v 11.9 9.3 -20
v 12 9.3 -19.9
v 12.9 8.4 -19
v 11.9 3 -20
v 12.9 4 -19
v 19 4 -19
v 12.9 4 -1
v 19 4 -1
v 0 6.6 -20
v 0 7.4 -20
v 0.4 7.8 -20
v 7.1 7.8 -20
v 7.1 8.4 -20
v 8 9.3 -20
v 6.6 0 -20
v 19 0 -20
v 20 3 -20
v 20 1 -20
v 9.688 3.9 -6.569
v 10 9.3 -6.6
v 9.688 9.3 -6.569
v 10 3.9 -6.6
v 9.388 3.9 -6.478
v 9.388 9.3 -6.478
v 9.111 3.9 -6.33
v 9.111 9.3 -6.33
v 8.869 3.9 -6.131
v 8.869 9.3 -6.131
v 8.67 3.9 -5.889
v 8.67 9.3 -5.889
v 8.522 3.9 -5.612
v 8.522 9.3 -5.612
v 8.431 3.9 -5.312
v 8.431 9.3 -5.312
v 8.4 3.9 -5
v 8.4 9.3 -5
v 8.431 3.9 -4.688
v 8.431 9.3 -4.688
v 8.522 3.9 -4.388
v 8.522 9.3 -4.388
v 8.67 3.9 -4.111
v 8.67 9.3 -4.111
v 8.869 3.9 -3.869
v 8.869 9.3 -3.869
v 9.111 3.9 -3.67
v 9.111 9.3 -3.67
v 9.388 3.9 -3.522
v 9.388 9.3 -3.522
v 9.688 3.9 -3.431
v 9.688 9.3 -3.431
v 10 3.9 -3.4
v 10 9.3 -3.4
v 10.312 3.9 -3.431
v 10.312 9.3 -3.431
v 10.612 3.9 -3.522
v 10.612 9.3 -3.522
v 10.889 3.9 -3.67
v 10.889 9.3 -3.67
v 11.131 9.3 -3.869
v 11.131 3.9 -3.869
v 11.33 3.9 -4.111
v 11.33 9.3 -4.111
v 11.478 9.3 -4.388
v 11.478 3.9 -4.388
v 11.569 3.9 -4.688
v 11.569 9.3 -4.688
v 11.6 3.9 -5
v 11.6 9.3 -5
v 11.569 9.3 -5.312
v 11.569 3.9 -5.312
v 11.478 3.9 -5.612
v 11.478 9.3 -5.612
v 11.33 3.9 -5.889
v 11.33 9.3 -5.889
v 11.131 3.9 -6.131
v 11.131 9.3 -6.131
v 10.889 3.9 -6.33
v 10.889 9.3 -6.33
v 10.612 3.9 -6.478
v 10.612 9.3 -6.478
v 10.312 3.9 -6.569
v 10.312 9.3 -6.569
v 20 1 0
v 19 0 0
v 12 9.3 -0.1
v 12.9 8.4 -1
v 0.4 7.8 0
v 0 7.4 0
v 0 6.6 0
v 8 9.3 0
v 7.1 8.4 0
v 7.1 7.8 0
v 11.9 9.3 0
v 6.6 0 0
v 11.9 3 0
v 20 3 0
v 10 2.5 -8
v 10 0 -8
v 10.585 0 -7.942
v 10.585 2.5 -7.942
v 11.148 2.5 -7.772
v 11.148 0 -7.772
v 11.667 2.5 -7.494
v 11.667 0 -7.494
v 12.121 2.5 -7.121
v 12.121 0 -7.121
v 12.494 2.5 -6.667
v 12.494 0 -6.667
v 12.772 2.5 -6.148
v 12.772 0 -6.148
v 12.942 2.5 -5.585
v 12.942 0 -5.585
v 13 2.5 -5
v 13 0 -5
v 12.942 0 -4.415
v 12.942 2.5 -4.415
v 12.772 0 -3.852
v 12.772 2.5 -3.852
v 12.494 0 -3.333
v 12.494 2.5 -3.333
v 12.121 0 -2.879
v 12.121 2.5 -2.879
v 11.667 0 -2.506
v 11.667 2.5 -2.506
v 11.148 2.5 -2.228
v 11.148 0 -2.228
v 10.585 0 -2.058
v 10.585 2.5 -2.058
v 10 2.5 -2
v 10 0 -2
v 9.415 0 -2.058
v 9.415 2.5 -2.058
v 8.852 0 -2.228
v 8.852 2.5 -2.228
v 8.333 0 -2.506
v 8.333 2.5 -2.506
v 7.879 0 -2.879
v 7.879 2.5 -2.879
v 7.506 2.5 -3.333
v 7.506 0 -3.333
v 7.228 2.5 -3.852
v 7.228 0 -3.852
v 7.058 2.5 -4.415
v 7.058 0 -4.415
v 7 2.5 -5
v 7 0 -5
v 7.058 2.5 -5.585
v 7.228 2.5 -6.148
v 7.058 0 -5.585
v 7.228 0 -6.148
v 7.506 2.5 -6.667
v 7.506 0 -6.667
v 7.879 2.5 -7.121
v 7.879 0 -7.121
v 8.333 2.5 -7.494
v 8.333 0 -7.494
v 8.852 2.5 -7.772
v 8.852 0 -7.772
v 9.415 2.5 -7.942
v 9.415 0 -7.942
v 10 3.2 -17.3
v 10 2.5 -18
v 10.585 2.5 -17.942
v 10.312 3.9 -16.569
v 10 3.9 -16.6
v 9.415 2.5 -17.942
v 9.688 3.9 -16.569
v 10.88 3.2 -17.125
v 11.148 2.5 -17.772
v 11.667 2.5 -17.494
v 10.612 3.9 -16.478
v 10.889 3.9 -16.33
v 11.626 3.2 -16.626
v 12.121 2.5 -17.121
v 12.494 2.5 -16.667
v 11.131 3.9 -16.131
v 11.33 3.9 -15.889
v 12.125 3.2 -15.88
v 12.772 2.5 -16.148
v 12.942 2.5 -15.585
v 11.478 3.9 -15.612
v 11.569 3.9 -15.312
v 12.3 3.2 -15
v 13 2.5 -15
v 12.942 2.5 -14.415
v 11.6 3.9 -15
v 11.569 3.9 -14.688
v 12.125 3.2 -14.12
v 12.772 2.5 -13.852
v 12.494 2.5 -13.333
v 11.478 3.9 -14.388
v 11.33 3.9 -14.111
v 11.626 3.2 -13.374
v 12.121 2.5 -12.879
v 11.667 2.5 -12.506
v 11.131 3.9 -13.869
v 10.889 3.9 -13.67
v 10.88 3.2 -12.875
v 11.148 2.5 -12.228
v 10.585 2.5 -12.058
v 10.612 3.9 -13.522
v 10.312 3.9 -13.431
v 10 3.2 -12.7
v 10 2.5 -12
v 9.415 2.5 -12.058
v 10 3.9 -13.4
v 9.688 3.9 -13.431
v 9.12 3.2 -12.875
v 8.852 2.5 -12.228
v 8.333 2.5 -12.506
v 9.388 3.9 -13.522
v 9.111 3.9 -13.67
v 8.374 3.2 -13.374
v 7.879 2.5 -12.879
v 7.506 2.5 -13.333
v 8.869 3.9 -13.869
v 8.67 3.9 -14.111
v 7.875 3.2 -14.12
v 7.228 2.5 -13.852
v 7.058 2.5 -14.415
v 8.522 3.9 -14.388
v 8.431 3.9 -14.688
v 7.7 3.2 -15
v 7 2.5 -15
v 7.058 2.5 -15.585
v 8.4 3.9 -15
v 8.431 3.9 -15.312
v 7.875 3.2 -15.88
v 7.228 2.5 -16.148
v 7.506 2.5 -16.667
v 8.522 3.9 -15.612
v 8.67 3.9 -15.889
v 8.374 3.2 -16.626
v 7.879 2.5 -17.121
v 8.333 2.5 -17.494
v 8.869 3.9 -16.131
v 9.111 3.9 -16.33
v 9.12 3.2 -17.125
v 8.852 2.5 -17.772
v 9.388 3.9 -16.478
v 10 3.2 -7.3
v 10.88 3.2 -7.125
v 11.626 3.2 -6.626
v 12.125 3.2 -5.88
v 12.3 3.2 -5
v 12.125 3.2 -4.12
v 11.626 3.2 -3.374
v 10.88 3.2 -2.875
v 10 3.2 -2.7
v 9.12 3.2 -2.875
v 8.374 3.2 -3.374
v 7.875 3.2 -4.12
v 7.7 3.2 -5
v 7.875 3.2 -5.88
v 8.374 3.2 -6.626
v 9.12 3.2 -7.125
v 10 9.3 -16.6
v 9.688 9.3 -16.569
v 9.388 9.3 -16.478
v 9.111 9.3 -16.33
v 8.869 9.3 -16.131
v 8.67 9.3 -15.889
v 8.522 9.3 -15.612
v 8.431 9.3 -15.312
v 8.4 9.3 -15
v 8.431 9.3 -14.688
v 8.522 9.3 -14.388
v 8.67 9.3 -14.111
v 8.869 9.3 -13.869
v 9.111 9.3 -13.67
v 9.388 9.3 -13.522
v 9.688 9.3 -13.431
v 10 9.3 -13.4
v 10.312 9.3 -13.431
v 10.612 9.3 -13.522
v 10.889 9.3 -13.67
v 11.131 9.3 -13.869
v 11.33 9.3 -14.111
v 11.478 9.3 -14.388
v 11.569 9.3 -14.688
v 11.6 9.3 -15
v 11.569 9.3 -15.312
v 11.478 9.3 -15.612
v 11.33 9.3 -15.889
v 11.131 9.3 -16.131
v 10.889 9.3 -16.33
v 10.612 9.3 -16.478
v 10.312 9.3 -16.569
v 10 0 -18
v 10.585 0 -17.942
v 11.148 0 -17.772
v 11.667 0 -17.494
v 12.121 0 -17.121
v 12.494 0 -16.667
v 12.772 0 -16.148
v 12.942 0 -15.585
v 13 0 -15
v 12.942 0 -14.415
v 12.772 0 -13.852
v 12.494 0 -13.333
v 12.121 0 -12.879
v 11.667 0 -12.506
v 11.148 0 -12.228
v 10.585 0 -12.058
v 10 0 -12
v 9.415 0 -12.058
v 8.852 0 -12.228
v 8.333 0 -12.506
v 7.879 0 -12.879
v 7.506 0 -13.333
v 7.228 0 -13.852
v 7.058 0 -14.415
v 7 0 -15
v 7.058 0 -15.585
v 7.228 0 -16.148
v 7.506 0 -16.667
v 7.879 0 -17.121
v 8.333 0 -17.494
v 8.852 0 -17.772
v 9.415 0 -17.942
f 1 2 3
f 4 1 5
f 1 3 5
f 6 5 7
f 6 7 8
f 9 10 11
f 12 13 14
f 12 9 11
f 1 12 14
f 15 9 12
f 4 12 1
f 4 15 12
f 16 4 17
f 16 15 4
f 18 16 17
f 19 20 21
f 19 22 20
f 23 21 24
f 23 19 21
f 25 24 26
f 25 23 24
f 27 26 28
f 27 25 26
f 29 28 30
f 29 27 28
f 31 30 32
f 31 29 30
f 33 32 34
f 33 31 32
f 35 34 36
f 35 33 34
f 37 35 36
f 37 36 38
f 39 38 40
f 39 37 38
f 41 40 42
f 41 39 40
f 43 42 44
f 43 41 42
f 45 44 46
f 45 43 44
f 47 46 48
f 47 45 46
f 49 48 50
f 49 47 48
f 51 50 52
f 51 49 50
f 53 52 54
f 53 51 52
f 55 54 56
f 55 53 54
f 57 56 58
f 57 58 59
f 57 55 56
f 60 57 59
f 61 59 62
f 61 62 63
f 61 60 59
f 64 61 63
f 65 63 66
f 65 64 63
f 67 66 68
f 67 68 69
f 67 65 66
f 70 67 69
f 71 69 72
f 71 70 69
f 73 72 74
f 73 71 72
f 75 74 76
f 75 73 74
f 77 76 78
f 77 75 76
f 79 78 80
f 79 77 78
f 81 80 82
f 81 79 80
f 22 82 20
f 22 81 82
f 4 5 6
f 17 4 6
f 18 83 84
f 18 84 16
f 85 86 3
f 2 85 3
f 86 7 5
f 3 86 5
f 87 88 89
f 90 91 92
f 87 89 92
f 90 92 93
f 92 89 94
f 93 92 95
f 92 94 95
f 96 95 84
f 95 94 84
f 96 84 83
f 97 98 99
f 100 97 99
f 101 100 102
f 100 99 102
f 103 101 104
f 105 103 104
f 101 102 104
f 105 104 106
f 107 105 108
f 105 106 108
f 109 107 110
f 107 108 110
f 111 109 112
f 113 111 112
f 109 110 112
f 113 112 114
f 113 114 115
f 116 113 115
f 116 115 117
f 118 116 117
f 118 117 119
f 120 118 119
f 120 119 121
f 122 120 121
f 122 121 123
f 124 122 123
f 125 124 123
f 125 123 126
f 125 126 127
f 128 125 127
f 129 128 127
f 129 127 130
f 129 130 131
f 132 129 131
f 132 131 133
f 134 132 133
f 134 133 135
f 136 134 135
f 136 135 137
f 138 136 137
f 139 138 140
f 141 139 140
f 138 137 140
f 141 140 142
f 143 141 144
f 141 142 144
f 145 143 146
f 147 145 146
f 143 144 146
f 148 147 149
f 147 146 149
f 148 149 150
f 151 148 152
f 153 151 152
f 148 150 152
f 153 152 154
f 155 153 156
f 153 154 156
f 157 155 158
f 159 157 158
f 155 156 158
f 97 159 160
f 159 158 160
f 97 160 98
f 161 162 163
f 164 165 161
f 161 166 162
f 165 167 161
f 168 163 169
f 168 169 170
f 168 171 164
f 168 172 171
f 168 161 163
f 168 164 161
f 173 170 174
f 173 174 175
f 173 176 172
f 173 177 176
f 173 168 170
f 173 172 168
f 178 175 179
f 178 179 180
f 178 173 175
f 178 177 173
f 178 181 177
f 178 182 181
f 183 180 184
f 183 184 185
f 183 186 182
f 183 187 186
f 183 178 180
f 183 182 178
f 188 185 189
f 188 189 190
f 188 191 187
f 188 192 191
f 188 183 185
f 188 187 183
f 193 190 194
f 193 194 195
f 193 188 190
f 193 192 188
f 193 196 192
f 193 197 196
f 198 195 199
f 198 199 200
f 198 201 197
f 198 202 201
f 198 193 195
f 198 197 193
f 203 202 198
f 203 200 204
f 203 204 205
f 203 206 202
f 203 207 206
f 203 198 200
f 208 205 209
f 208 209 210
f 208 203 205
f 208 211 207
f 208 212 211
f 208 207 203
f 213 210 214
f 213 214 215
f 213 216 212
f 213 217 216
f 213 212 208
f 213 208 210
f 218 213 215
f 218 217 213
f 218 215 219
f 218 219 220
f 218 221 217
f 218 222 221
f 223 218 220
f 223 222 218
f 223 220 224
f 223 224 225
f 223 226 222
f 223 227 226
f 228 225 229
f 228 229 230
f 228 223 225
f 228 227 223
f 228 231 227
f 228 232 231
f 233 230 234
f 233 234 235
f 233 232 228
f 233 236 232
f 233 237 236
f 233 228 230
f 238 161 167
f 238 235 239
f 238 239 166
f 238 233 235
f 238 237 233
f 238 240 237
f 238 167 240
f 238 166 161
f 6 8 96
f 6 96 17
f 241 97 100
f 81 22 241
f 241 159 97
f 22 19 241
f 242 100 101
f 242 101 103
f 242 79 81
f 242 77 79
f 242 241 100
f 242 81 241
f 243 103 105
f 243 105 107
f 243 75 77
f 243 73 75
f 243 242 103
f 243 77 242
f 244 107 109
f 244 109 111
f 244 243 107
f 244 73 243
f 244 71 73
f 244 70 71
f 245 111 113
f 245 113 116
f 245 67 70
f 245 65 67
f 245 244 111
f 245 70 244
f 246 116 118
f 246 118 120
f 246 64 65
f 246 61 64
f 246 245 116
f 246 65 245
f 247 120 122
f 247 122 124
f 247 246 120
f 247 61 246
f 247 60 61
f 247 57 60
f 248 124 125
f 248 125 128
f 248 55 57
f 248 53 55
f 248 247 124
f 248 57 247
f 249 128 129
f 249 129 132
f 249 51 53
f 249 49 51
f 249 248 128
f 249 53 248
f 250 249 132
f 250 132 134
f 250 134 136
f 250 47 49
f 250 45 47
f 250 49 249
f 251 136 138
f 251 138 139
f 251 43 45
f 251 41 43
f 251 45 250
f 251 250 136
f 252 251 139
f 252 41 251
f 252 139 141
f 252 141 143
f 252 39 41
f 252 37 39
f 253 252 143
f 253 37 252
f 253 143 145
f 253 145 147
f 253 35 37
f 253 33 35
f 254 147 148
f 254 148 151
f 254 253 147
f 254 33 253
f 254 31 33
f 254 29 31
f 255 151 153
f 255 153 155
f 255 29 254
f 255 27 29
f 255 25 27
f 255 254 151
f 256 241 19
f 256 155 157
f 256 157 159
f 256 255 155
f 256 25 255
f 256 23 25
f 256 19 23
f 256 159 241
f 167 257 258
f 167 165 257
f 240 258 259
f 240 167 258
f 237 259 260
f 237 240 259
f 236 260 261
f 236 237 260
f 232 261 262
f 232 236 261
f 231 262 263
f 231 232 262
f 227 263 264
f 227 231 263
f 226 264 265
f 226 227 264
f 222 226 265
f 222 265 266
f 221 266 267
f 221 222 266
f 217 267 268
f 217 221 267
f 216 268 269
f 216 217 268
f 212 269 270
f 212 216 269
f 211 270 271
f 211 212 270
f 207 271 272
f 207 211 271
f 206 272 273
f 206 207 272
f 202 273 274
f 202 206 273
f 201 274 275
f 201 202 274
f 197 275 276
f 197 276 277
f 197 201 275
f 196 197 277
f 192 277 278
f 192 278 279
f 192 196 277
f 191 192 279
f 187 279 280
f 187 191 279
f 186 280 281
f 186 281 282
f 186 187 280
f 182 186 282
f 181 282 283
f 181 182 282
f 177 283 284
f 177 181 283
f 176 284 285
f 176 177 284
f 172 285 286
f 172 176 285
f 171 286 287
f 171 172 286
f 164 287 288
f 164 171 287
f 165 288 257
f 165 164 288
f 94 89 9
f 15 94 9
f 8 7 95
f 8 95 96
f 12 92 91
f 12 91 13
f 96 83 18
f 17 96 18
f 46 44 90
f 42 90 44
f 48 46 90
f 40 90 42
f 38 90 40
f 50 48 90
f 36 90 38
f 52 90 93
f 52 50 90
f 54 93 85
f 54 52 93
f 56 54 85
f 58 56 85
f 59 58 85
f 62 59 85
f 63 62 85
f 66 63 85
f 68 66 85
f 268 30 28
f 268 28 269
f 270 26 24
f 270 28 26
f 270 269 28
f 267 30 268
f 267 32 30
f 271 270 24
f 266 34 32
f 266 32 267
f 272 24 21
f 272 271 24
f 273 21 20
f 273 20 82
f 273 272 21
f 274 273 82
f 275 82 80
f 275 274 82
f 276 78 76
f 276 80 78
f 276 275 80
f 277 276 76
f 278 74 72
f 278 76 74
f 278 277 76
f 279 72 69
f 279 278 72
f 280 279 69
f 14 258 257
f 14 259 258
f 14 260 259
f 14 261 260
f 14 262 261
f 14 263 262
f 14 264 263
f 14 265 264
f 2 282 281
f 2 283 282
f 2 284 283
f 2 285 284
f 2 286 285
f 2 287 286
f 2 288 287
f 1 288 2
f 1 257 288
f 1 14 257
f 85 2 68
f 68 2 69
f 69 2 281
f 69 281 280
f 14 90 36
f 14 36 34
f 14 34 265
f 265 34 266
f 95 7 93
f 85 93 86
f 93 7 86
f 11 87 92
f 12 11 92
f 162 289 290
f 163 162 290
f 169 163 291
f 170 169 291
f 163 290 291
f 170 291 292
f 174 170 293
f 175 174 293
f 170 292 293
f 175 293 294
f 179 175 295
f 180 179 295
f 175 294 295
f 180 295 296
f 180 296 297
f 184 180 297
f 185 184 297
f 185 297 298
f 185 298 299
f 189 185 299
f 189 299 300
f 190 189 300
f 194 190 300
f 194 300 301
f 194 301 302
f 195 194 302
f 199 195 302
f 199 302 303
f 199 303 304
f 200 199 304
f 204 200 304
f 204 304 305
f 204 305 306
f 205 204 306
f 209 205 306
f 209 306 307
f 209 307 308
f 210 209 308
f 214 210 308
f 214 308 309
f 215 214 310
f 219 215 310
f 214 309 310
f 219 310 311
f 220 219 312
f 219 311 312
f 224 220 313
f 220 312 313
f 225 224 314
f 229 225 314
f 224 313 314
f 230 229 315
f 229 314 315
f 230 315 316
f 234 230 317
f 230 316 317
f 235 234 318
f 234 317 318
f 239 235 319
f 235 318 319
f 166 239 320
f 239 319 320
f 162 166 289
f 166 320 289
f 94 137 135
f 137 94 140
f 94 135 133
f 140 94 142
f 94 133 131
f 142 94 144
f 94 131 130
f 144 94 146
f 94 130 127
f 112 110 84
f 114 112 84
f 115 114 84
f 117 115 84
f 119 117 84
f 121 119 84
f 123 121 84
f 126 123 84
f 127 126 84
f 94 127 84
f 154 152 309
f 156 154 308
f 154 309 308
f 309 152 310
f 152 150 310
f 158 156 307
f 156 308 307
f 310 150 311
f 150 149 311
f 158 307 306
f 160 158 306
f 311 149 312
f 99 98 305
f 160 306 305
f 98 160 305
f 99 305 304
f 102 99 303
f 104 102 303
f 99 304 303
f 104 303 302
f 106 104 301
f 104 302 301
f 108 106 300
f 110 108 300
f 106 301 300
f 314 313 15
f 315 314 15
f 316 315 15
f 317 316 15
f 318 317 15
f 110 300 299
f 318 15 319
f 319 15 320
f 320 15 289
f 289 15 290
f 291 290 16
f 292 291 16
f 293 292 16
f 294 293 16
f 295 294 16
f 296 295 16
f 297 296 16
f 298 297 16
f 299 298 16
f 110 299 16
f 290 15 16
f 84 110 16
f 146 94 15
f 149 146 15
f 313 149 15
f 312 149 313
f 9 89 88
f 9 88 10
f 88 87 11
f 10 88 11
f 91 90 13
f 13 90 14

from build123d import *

# Parameters (mm, degrees)
SKETCH_1_W          = 20
SKETCH_1_H          = 20
EXTRUDE_1_DEPTH     = 4
SKETCH_2_W          = 12.9
SKETCH_2_H          = 20
EXTRUDE_2_DEPTH     = 3.8
SKETCH_3_R          = 1.6
CUT_EXTRUDE_1_DEPTH = 30.340074983
SKETCH_4_W          = 5.8
SKETCH_4_H          = 20
SKETCH_4_R          = 1.6
EXTRUDE_3_DEPTH     = 1.5
SKETCH_5_R          = 3
CUT_EXTRUDE_3_DEPTH = 2.4
CHAMFER_3_SIZE      = 1.5
CHAMFER_1_SIZE      = 6.6
CHAMFER_2_SIZE      = 1
CHAMFER_4_SIZE      = 0.4
CHAMFER_5_SIZE      = 0.9


with BuildPart() as part:
    # 草图1 → 凸台-拉伸1 (new body)
    with BuildSketch(Plane(origin=(0, 0, 0), x_dir=(1, 0, 0), z_dir=(0, 1, 0))):
        with Locations((10, 10)):
            Rectangle(SKETCH_1_W, SKETCH_1_H)
    extrude(amount=EXTRUDE_1_DEPTH)

    # 草图2 → 凸台-拉伸2 (add)
    with BuildSketch(Plane(origin=(0, 4, 0), x_dir=(1, 0, 0), z_dir=(0, 1, 0))):
        with Locations((6.45, 10)):
            Rectangle(SKETCH_2_W, SKETCH_2_H)
    extrude(amount=EXTRUDE_2_DEPTH)

    # 草图3 → 切除-拉伸1 (cut, through all)
    with BuildSketch(Plane(origin=(0, 0, 0), x_dir=(-1, 0, 0), z_dir=(0, -1, 0))):
        with Locations(Location((-10, 5, 0), (0, 0, 90))):
            Circle(SKETCH_3_R)
        with Locations(Location((-10, 15, 0), (0, 0, 90))):
            Circle(SKETCH_3_R)
    extrude(amount=-CUT_EXTRUDE_1_DEPTH, mode=Mode.SUBTRACT)

    # 草图4 → 凸台-拉伸3 (add)
    with BuildSketch(Plane(origin=(0, 7.8, 0), x_dir=(1, 0, 0), z_dir=(0, 1, 0))):
        with Locations((10, 10)):
            Rectangle(SKETCH_4_W, SKETCH_4_H)
        with Locations(Location((10, 15, 0), (0, 0, 90))):
            Circle(SKETCH_4_R, mode=Mode.SUBTRACT)
        with Locations(Location((10, 5, 0), (0, 0, 90))):
            Circle(SKETCH_4_R, mode=Mode.SUBTRACT)
    extrude(amount=EXTRUDE_3_DEPTH)

    # 草图5 → 切除-拉伸3 (cut)
    with BuildSketch(Plane(origin=(0, 0, 0), x_dir=(-1, 0, 0), z_dir=(0, -1, 0))):
        with Locations(Location((-10, 5, 0), (0, 0, 90))):
            Circle(SKETCH_5_R)
        with Locations(Location((-10, 15, 0), (0, 0, 90))):
            Circle(SKETCH_5_R)
    extrude(amount=-CUT_EXTRUDE_3_DEPTH, mode=Mode.SUBTRACT)

    # 倒角3
    # the kernel refuses this chamfer: 1.5 mm, written as the material it takes off along each edge
    with BuildSketch(Plane(origin=(10, 2.4, -15), x_dir=(0, 0, -1), z_dir=(-1, 0, 0))) as chamfer_3_piece_1_section:
        Polygon((1.6 + CHAMFER_3_SIZE, 0), (1.6, -CHAMFER_3_SIZE), (1.6, 0), align=None)
    chamfer_3_piece_1 = revolve(axis=Axis((10, 2.4, -15), (0, -1, 0)), mode=Mode.PRIVATE)
    chamfer_3_piece_1 = chamfer_3_piece_1 & Plane(origin=(10, 3.20338318, -15), x_dir=(0, 0, -1), z_dir=(0, -1, 0)) * Cylinder(3, 13, mode=Mode.PRIVATE)
    add(chamfer_3_piece_1, mode=Mode.SUBTRACT)
    with BuildSketch(Plane(origin=(10, 2.4, -5), x_dir=(0, 0, -1), z_dir=(-1, 0, 0))) as chamfer_3_piece_2_section:
        Polygon((1.6 + CHAMFER_3_SIZE, 0), (1.6, -CHAMFER_3_SIZE), (1.6, 0), align=None)
    chamfer_3_piece_2 = revolve(axis=Axis((10, 2.4, -5), (0, -1, 0)), mode=Mode.PRIVATE)
    chamfer_3_piece_2 = chamfer_3_piece_2 & Plane(origin=(10, 3.20338318, -5), x_dir=(0, 0, -1), z_dir=(0, -1, 0)) * Cylinder(3, 13, mode=Mode.PRIVATE)
    add(chamfer_3_piece_2, mode=Mode.SUBTRACT)

    # 倒角1
    chamfer_1_edges = [part.edges().sort_by_distance(p)[0] for p in [
        (0, 0, -10),
    ]]
    chamfer(chamfer_1_edges, length=CHAMFER_1_SIZE)

    # 倒角2
    chamfer_2_edges = [part.edges().sort_by_distance(p)[0] for p in [
        (20, 4, -10),
        (16.45, 4, 0),
        (12.9, 6.65, 0),
        (12.9, 6.65, -20),
        (16.45, 4, -20),
        (20, 0, -10),
    ]]
    chamfer(chamfer_2_edges, length=CHAMFER_2_SIZE)

    # 倒角4
    chamfer_4_edges = [part.edges().sort_by_distance(p)[0] for p in [
        (0, 7.8, -10),
    ]]
    chamfer(chamfer_4_edges, length=CHAMFER_4_SIZE)

    # 倒角5
    chamfer_5_edges = [part.edges().sort_by_distance(p)[0] for p in [
        (7.1, 9.3, -10),
        (12.9, 9.3, -10),
    ]]
    chamfer(chamfer_5_edges, length=CHAMFER_5_SIZE)


solid = part.part
